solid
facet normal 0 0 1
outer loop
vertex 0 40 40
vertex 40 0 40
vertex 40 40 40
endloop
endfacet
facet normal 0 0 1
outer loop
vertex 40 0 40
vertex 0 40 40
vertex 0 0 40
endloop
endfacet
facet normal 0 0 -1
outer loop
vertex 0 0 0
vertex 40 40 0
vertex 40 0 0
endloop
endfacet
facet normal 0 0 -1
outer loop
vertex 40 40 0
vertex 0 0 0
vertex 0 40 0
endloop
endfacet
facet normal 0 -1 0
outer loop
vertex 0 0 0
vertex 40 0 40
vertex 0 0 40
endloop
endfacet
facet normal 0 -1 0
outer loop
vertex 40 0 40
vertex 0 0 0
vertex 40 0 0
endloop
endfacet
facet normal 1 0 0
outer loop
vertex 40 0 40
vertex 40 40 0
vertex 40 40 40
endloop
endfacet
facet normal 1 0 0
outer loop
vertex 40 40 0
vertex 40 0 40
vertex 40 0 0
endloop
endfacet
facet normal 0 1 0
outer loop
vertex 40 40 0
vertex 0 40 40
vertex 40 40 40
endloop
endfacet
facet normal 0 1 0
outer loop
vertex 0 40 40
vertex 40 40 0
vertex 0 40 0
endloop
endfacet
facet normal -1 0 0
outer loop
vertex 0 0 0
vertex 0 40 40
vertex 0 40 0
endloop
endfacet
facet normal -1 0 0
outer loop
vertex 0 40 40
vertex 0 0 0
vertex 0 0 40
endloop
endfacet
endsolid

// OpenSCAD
// Unsaved Native Agent acceptance buffer
width=40; // [0:100] IDs in Assembly.md; preserve this explanation
cube(width);
